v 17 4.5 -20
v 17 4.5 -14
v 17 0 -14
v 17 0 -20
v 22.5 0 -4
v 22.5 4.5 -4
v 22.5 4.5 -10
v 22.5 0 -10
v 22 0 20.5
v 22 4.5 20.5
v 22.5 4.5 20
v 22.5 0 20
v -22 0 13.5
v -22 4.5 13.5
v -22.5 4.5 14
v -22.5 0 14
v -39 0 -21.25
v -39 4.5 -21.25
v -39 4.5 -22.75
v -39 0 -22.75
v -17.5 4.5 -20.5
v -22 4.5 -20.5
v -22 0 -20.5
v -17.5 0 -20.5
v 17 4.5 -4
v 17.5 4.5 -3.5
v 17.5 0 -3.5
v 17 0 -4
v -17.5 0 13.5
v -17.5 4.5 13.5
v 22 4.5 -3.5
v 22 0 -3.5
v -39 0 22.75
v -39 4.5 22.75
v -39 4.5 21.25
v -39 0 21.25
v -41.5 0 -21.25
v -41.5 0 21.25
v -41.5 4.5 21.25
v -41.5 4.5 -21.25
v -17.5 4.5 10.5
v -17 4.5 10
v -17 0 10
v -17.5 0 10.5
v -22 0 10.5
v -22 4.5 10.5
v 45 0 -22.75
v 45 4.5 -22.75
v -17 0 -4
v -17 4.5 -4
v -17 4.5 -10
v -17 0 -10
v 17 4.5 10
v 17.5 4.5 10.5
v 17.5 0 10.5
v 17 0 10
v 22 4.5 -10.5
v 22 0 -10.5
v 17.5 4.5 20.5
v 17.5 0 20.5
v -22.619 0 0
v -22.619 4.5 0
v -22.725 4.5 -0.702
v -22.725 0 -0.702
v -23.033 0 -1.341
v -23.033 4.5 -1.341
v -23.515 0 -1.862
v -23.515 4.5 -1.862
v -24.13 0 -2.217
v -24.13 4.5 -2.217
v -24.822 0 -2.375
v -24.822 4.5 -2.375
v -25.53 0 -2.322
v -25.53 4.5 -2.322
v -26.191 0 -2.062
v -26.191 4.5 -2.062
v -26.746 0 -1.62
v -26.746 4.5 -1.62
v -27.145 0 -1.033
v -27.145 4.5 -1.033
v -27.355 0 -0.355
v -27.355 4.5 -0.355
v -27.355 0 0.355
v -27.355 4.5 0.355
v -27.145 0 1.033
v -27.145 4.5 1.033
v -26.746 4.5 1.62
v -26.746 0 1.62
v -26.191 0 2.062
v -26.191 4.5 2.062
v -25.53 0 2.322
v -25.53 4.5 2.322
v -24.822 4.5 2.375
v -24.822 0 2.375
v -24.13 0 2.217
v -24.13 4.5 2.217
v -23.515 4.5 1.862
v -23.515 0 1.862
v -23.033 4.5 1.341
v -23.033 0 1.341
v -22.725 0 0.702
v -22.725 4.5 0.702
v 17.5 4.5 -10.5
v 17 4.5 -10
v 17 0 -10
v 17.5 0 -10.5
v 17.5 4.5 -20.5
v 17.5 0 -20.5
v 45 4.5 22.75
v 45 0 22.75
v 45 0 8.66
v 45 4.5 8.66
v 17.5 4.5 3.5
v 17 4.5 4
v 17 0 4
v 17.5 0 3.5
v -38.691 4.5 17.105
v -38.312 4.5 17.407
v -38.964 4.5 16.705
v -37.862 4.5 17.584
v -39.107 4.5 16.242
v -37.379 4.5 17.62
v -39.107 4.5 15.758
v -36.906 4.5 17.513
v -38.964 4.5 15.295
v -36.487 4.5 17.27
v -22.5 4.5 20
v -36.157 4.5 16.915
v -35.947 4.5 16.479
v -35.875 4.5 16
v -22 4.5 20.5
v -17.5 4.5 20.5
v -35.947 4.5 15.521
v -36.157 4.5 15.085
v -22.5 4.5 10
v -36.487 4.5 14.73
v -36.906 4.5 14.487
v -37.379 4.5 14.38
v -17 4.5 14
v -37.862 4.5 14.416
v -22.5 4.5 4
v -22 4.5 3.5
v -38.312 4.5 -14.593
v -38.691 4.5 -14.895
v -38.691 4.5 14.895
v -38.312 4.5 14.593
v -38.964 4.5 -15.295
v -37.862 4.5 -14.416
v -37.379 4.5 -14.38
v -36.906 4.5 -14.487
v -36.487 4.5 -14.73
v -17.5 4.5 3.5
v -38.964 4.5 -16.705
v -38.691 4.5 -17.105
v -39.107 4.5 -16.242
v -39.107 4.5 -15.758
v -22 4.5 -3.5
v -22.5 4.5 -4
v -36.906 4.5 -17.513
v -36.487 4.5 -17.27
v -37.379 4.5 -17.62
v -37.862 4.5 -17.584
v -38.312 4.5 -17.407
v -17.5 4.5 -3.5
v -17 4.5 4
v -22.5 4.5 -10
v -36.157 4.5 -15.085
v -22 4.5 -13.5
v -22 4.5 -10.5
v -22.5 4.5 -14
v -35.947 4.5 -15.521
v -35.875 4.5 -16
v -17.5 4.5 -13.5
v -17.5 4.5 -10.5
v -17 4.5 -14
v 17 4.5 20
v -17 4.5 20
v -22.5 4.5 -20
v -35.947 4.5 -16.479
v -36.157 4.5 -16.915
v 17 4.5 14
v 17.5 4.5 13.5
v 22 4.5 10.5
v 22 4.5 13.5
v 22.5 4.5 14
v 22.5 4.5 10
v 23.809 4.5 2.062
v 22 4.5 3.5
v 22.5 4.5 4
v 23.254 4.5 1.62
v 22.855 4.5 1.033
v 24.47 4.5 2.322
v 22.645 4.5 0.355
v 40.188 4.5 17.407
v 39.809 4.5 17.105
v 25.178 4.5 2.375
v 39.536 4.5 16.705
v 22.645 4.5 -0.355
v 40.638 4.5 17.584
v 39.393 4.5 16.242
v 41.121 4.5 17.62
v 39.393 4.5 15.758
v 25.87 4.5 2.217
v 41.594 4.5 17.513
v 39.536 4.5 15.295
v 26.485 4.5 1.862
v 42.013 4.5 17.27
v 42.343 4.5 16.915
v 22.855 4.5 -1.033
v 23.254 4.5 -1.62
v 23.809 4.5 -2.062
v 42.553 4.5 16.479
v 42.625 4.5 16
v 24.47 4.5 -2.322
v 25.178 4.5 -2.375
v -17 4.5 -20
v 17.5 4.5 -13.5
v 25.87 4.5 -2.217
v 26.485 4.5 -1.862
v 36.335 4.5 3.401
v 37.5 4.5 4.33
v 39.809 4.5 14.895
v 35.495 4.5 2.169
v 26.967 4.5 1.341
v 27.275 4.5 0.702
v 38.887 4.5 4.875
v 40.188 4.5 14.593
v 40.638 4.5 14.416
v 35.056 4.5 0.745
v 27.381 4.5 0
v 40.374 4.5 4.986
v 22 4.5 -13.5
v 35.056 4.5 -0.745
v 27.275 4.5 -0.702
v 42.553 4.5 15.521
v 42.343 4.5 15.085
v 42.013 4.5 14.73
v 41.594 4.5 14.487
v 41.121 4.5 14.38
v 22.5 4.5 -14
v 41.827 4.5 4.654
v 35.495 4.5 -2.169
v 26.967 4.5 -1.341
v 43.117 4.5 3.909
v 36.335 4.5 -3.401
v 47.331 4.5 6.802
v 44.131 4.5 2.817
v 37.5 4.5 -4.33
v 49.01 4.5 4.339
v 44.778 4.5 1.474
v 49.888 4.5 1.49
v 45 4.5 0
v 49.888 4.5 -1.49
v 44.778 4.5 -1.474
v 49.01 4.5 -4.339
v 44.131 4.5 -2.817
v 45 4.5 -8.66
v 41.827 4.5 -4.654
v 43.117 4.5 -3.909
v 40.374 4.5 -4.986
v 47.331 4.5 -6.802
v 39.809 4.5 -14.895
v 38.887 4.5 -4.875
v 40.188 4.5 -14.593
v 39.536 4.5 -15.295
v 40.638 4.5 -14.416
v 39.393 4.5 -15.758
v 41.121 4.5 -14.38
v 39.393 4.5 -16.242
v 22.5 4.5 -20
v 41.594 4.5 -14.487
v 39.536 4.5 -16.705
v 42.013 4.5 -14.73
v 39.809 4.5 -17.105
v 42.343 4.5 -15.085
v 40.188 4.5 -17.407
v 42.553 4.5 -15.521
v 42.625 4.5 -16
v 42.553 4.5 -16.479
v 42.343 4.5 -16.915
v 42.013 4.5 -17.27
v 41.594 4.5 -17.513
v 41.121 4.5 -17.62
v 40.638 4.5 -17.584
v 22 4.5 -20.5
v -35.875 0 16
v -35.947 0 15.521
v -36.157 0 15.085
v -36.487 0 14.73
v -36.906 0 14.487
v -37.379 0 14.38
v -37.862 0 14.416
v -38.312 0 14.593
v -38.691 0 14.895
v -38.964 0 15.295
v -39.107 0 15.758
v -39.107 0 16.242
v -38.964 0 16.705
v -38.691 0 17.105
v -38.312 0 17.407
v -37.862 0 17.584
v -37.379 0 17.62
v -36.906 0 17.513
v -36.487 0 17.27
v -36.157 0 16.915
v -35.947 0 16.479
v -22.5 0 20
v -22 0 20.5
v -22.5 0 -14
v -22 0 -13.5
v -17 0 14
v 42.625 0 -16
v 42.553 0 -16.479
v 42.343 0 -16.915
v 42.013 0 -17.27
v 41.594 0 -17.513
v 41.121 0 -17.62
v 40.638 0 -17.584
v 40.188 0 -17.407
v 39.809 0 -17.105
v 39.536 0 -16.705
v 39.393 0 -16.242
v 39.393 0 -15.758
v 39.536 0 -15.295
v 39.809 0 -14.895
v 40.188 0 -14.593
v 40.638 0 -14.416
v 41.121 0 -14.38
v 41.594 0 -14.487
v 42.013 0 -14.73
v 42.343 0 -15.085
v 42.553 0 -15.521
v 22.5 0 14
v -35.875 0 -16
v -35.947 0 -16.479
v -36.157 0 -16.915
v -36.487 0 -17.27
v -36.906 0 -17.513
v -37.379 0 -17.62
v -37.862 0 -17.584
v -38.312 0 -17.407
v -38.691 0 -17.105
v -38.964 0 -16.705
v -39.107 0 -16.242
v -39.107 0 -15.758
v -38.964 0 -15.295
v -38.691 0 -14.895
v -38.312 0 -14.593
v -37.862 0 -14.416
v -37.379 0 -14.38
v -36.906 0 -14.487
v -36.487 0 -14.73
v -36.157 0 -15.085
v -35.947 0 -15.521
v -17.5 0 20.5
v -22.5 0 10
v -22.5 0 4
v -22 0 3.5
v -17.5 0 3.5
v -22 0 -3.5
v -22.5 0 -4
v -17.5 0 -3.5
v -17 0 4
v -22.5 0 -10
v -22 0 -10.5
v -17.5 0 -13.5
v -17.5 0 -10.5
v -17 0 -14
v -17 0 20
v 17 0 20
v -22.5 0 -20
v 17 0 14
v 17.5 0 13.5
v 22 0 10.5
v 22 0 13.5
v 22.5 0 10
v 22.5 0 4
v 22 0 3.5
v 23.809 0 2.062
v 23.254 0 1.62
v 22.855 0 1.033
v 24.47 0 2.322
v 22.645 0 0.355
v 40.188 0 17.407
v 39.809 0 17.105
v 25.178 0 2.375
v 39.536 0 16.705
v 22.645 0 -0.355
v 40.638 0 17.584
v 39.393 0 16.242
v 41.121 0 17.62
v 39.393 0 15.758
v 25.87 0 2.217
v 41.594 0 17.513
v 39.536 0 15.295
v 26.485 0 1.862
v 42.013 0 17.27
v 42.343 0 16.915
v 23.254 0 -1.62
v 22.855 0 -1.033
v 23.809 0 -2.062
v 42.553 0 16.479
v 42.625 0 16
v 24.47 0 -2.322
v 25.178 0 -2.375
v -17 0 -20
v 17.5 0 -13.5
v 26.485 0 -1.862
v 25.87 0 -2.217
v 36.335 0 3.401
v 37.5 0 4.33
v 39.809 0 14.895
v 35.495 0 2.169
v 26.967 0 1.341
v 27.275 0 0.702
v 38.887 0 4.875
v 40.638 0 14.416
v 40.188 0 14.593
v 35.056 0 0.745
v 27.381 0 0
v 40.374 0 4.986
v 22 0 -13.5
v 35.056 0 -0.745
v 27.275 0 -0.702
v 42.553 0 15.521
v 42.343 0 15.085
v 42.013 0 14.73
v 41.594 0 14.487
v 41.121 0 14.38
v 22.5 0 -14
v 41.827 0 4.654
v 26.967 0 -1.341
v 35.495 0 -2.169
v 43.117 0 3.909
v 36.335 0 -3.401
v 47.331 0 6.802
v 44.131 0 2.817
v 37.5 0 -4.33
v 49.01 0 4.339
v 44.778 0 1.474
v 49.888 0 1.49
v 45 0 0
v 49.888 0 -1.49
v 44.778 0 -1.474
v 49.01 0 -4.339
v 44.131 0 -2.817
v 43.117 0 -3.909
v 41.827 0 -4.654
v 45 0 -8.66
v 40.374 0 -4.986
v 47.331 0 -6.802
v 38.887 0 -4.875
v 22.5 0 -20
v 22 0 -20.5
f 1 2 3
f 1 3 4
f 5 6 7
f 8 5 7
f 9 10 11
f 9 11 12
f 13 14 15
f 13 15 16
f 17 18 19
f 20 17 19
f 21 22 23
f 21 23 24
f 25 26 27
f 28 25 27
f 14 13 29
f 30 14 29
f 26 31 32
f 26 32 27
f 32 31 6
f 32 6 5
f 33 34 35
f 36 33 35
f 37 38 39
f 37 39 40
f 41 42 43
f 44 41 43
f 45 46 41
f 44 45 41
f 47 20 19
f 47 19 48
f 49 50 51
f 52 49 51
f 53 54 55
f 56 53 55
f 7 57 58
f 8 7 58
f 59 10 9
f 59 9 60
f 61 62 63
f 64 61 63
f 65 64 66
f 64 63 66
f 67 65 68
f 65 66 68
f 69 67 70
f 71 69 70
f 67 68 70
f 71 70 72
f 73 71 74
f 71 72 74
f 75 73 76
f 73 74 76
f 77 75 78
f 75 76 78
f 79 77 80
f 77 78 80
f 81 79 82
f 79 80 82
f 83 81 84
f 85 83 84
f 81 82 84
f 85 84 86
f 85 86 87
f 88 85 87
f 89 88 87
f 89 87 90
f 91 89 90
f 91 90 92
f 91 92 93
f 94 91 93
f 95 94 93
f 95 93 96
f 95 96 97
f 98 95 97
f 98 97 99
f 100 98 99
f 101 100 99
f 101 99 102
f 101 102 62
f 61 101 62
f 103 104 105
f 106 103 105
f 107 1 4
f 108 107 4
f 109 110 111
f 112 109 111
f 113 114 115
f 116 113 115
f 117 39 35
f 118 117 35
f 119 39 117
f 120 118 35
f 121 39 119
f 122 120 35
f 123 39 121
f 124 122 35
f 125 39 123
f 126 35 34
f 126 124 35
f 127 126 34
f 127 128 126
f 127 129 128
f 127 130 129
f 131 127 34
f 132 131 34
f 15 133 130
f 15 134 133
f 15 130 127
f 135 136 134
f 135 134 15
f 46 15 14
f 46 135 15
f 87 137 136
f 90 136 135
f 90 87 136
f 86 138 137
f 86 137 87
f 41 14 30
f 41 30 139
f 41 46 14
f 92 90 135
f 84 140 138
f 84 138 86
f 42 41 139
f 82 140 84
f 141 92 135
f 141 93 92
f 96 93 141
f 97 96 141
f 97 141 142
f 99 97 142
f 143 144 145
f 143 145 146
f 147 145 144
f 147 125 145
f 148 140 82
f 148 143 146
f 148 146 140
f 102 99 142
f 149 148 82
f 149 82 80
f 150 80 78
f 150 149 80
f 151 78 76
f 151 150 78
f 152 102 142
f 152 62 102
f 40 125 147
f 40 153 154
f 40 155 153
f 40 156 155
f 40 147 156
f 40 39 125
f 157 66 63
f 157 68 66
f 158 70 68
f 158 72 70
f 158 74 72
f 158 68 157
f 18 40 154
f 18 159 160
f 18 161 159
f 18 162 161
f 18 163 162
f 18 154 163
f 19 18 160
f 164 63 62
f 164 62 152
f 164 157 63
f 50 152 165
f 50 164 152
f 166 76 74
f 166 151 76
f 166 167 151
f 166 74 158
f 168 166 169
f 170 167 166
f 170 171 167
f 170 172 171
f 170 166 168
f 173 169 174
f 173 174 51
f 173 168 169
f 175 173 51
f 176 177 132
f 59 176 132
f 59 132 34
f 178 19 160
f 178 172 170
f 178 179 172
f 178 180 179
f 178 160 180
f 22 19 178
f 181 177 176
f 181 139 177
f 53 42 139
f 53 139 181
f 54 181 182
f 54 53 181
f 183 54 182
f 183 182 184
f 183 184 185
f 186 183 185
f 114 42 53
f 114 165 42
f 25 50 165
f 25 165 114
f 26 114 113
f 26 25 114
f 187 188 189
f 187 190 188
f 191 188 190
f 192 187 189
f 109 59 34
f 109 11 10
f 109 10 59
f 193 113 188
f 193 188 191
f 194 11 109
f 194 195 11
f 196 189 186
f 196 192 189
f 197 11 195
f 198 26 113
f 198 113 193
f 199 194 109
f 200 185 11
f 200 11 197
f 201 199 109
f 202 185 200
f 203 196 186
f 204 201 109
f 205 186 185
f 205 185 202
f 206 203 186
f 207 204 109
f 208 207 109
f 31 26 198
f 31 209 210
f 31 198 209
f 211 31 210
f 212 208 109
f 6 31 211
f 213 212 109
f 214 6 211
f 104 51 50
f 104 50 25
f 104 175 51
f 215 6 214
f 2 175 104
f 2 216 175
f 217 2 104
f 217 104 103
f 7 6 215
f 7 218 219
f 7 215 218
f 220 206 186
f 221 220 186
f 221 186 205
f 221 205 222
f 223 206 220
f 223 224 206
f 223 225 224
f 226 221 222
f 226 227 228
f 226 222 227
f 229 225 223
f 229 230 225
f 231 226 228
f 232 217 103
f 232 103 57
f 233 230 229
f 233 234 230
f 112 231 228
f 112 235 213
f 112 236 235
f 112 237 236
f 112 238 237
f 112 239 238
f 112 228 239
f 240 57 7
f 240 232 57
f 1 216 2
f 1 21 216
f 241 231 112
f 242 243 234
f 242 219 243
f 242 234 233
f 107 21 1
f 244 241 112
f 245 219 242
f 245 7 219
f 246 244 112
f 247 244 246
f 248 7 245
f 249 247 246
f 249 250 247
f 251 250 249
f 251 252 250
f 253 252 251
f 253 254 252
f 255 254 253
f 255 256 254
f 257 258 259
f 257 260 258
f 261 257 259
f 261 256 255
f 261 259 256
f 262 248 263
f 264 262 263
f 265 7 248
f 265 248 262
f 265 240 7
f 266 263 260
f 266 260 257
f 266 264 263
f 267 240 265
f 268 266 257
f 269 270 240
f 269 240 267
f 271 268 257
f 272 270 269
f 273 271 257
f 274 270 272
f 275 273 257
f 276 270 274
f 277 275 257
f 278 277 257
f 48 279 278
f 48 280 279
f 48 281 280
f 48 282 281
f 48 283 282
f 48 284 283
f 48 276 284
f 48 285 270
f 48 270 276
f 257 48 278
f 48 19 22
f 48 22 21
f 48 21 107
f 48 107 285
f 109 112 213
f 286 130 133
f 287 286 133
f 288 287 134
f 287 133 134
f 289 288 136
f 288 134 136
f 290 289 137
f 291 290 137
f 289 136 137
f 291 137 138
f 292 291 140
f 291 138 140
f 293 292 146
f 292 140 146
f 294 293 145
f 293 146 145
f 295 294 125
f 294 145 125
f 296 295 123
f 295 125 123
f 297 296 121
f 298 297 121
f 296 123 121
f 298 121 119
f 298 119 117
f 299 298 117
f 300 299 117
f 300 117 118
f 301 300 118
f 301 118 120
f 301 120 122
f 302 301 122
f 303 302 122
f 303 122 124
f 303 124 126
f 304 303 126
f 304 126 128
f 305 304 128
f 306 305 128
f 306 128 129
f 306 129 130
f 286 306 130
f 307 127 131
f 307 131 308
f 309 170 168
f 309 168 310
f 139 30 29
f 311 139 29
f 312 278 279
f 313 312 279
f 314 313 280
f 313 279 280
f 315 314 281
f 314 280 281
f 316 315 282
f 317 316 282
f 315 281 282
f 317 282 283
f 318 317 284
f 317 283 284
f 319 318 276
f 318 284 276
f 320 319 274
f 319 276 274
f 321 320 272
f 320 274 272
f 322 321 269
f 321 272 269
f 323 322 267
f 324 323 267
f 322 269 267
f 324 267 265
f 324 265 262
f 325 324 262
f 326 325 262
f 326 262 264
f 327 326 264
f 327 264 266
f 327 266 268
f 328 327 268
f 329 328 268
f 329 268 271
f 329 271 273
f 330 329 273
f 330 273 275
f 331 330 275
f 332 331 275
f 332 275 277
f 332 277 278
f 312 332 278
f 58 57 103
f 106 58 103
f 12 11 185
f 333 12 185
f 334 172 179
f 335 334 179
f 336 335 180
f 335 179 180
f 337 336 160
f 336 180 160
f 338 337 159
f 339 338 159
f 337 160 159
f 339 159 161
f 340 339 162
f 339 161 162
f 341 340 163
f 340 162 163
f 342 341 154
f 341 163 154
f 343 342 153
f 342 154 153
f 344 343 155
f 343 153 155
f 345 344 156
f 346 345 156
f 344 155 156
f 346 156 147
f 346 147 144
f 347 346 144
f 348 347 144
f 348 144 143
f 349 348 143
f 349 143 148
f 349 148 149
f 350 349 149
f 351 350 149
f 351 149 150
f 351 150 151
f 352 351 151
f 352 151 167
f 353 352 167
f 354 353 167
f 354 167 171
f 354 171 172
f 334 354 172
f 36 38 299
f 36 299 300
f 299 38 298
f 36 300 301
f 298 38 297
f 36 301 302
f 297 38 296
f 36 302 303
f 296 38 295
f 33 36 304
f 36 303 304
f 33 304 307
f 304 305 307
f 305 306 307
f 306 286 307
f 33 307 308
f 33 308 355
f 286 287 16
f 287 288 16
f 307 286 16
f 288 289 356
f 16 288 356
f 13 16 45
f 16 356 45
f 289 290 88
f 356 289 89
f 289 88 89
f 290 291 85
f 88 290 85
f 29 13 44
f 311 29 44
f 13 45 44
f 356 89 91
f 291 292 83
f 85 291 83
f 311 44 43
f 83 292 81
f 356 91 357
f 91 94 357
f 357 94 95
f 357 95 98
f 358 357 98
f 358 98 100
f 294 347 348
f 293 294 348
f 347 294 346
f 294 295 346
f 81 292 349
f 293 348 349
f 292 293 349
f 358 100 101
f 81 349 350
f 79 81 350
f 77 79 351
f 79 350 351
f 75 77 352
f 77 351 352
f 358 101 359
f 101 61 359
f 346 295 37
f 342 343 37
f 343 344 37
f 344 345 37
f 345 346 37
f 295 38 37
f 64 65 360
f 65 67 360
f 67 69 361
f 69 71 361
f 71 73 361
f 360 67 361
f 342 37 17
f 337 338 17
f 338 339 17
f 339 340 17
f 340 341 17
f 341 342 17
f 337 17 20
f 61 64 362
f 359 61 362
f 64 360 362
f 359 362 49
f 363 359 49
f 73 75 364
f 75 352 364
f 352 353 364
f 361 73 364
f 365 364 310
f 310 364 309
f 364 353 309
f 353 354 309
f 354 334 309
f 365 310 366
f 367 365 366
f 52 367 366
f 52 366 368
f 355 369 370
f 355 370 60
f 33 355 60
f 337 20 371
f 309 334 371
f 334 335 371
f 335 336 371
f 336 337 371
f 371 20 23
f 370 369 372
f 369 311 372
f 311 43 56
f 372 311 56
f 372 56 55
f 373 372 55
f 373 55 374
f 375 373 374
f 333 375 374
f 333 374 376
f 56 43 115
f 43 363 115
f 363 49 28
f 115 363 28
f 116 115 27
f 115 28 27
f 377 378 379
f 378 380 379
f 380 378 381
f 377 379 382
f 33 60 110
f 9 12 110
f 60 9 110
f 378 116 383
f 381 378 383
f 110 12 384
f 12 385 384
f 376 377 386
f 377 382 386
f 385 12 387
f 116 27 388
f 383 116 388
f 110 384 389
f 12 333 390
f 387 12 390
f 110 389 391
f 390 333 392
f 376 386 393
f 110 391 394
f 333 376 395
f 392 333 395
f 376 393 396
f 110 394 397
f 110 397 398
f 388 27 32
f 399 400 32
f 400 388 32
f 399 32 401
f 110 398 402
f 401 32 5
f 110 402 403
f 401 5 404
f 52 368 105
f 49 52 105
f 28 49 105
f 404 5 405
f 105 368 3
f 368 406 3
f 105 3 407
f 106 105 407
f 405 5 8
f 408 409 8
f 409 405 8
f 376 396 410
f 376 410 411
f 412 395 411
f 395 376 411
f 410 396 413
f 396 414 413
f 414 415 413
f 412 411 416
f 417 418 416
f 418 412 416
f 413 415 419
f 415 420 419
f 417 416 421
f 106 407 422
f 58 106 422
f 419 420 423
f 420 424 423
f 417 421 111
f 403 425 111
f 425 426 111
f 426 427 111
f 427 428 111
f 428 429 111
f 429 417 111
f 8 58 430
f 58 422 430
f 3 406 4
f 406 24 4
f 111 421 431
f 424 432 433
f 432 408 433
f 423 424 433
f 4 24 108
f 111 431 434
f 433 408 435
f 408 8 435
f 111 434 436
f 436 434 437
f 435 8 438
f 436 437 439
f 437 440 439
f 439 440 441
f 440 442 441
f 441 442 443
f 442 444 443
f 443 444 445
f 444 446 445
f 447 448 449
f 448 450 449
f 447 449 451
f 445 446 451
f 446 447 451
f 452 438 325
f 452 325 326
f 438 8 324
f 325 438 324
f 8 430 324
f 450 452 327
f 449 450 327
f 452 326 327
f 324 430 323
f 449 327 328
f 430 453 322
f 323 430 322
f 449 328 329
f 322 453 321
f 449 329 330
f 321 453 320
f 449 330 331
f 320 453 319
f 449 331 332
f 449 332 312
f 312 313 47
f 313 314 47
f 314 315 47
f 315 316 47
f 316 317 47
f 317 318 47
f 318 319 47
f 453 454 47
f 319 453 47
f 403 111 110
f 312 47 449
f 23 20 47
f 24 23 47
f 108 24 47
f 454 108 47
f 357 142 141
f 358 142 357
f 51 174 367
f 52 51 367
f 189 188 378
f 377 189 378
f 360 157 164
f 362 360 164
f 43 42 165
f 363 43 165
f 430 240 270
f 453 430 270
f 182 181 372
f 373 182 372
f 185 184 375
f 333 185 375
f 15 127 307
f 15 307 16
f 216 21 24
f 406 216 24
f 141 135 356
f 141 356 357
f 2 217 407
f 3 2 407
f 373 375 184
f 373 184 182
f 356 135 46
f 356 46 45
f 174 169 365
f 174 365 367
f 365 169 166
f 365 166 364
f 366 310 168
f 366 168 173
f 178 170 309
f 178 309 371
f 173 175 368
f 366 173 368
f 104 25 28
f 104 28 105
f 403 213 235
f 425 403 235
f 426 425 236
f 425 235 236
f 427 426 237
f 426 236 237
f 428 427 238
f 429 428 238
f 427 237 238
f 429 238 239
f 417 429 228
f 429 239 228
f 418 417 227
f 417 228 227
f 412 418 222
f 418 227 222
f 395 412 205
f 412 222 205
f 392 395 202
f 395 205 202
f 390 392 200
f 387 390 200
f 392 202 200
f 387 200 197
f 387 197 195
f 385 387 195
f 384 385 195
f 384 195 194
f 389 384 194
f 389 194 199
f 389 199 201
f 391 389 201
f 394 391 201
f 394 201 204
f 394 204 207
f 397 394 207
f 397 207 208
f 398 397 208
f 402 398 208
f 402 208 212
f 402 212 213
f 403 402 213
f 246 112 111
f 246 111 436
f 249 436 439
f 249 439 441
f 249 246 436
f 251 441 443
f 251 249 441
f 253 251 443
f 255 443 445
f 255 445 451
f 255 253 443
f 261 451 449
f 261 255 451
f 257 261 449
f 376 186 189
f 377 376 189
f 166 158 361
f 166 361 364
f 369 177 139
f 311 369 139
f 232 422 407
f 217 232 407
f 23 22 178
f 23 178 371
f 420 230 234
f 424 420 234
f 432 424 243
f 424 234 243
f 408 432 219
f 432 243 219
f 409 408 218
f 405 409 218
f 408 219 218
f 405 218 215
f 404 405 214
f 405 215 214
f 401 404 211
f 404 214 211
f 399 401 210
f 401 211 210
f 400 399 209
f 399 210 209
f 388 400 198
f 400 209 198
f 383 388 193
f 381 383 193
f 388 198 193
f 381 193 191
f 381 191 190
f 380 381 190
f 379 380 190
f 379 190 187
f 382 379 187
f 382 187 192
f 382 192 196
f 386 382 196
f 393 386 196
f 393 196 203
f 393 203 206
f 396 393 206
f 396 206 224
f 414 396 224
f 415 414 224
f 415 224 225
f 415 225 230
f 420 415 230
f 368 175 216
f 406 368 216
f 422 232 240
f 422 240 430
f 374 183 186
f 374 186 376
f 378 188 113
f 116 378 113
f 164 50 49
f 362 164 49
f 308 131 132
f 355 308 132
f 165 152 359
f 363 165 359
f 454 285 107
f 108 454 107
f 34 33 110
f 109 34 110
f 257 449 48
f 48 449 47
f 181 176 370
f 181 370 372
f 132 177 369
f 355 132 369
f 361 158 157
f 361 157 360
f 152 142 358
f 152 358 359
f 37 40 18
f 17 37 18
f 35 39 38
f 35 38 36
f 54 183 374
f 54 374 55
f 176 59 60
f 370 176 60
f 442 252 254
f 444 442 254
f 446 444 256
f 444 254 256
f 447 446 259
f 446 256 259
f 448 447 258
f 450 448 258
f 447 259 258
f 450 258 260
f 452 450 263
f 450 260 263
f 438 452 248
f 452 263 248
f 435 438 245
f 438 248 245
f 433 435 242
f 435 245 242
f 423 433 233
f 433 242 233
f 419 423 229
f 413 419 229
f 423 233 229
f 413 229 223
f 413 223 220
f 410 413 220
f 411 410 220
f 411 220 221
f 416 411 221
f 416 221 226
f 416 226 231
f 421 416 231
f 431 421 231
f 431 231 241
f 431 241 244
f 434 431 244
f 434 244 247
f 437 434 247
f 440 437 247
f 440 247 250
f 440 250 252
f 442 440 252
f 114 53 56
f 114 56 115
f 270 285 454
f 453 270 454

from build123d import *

# Parameters (mm, degrees)
SKETCH2_W           = 86.5
SKETCH2_H           = 45.5
BOSS_EXTRUDE1_DEPTH = 4.5
SKETCH3_R           = 1.625
SKETCH3_R_2         = 2.38125
CUT_EXTRUDE1_DEPTH  = 5.5
SKETCH4_W           = 5.5
SKETCH4_H           = 7
CUT_EXTRUDE2_DEPTH  = 5.5
CHAMFER1_SIZE       = 0.5
SKETCH5_R           = 10
BOSS_EXTRUDE2_DEPTH = 4.5
SKETCH6_R           = 5
SKETCH6_W           = 2.5
SKETCH6_H           = 1.5
CUT_EXTRUDE3_DEPTH  = 5.5


with BuildPart() as part:
    # Sketch2 → Boss-Extrude1 (new body)
    with BuildSketch(Plane(origin=(0, 0, 0), x_dir=(1, 0, 0), z_dir=(0, 1, 0))):
        with Locations((1.75, 0)):
            Rectangle(SKETCH2_W, SKETCH2_H)
    extrude(amount=BOSS_EXTRUDE1_DEPTH)

    # Sketch3 → Cut-Extrude1 (cut, through all)
    with BuildSketch(Plane(origin=(0, 4.5, 0), x_dir=(1, 0, 0), z_dir=(0, 1, 0))):
        with Locations((-37.5, -16)):
            Circle(SKETCH3_R)
        with Locations((-37.5, 16)):
            Circle(SKETCH3_R)
        with Locations((41, 16)):
            Circle(SKETCH3_R)
        with Locations((41, -16)):
            Circle(SKETCH3_R)
        with Locations((25, 0)):
            Circle(SKETCH3_R_2)
        with Locations((-25, 0)):
            Circle(SKETCH3_R_2)
    extrude(amount=-CUT_EXTRUDE1_DEPTH, mode=Mode.SUBTRACT)

    # Sketch4 → Cut-Extrude2 (cut, through all)
    with BuildSketch(Plane(origin=(0, 4.5, 0), x_dir=(1, 0, 0), z_dir=(0, 1, 0))):
        with Locations((-19.75, 7)):
            Rectangle(SKETCH4_W, SKETCH4_H)
        with Locations((-19.75, -7)):
            Rectangle(SKETCH4_W, SKETCH4_H)
        with Locations((-19.75, 17)):
            Rectangle(SKETCH4_W, SKETCH4_H)
        with Locations((-19.75, -17)):
            Rectangle(SKETCH4_W, SKETCH4_H)
    cut_extrude2 = extrude(amount=-CUT_EXTRUDE2_DEPTH, mode=Mode.SUBTRACT)

    # Mirror1: Cut-Extrude2 across plane
    add(cut_extrude2.mirror(Plane(origin=(0, 0, 0), x_dir=(0, 0, 1), z_dir=(1, 0, 0))), mode=Mode.SUBTRACT)

    # Chamfer1
    chamfer1_edges = [part.edges().sort_by_distance(p)[0] for p in [
        (22.5, 2.25, -10.5),
        (22.5, 2.25, -3.5),
        (17, 2.25, -3.5),
        (17, 2.25, -10.5),
        (22.5, 2.25, 3.5),
        (22.5, 2.25, 10.5),
        (17, 2.25, 10.5),
        (17, 2.25, 3.5),
        (22.5, 2.25, -20.5),
        (22.5, 2.25, -13.5),
        (17, 2.25, -13.5),
        (17, 2.25, -20.5),
        (22.5, 2.25, 13.5),
        (22.5, 2.25, 20.5),
        (17, 2.25, 20.5),
        (17, 2.25, 13.5),
        (-22.5, 2.25, -3.5),
        (-22.5, 2.25, -10.5),
        (-17, 2.25, -10.5),
        (-17, 2.25, -3.5),
        (-22.5, 2.25, 10.5),
        (-22.5, 2.25, 3.5),
        (-17, 2.25, 3.5),
        (-17, 2.25, 10.5),
        (-22.5, 2.25, -13.5),
        (-22.5, 2.25, -20.5),
        (-17, 2.25, -20.5),
        (-17, 2.25, -13.5),
        (-22.5, 2.25, 20.5),
        (-22.5, 2.25, 13.5),
        (-17, 2.25, 13.5),
        (-17, 2.25, 20.5),
    ]]
    chamfer(chamfer1_edges, length=CHAMFER1_SIZE)

    # Sketch5 → Boss-Extrude2 (add)
    with BuildSketch(Plane(origin=(0, 4.5, 0), x_dir=(1, 0, 0), z_dir=(0, 1, 0))):
        with Locations((40, 0)):
            Circle(SKETCH5_R)
    extrude(amount=-BOSS_EXTRUDE2_DEPTH)

    # Sketch6 → Cut-Extrude3 (cut, through all)
    with BuildSketch(Plane(origin=(0, 4.5, 0), x_dir=(1, 0, 0), z_dir=(0, 1, 0))):
        with Locations((40, 0)):
            Circle(SKETCH6_R)
        with Locations((-40.25, -22)):
            Rectangle(SKETCH6_W, SKETCH6_H)
        with Locations((-40.25, 22)):
            Rectangle(SKETCH6_W, SKETCH6_H)
    extrude(amount=-CUT_EXTRUDE3_DEPTH, mode=Mode.SUBTRACT)


solid = part.part
